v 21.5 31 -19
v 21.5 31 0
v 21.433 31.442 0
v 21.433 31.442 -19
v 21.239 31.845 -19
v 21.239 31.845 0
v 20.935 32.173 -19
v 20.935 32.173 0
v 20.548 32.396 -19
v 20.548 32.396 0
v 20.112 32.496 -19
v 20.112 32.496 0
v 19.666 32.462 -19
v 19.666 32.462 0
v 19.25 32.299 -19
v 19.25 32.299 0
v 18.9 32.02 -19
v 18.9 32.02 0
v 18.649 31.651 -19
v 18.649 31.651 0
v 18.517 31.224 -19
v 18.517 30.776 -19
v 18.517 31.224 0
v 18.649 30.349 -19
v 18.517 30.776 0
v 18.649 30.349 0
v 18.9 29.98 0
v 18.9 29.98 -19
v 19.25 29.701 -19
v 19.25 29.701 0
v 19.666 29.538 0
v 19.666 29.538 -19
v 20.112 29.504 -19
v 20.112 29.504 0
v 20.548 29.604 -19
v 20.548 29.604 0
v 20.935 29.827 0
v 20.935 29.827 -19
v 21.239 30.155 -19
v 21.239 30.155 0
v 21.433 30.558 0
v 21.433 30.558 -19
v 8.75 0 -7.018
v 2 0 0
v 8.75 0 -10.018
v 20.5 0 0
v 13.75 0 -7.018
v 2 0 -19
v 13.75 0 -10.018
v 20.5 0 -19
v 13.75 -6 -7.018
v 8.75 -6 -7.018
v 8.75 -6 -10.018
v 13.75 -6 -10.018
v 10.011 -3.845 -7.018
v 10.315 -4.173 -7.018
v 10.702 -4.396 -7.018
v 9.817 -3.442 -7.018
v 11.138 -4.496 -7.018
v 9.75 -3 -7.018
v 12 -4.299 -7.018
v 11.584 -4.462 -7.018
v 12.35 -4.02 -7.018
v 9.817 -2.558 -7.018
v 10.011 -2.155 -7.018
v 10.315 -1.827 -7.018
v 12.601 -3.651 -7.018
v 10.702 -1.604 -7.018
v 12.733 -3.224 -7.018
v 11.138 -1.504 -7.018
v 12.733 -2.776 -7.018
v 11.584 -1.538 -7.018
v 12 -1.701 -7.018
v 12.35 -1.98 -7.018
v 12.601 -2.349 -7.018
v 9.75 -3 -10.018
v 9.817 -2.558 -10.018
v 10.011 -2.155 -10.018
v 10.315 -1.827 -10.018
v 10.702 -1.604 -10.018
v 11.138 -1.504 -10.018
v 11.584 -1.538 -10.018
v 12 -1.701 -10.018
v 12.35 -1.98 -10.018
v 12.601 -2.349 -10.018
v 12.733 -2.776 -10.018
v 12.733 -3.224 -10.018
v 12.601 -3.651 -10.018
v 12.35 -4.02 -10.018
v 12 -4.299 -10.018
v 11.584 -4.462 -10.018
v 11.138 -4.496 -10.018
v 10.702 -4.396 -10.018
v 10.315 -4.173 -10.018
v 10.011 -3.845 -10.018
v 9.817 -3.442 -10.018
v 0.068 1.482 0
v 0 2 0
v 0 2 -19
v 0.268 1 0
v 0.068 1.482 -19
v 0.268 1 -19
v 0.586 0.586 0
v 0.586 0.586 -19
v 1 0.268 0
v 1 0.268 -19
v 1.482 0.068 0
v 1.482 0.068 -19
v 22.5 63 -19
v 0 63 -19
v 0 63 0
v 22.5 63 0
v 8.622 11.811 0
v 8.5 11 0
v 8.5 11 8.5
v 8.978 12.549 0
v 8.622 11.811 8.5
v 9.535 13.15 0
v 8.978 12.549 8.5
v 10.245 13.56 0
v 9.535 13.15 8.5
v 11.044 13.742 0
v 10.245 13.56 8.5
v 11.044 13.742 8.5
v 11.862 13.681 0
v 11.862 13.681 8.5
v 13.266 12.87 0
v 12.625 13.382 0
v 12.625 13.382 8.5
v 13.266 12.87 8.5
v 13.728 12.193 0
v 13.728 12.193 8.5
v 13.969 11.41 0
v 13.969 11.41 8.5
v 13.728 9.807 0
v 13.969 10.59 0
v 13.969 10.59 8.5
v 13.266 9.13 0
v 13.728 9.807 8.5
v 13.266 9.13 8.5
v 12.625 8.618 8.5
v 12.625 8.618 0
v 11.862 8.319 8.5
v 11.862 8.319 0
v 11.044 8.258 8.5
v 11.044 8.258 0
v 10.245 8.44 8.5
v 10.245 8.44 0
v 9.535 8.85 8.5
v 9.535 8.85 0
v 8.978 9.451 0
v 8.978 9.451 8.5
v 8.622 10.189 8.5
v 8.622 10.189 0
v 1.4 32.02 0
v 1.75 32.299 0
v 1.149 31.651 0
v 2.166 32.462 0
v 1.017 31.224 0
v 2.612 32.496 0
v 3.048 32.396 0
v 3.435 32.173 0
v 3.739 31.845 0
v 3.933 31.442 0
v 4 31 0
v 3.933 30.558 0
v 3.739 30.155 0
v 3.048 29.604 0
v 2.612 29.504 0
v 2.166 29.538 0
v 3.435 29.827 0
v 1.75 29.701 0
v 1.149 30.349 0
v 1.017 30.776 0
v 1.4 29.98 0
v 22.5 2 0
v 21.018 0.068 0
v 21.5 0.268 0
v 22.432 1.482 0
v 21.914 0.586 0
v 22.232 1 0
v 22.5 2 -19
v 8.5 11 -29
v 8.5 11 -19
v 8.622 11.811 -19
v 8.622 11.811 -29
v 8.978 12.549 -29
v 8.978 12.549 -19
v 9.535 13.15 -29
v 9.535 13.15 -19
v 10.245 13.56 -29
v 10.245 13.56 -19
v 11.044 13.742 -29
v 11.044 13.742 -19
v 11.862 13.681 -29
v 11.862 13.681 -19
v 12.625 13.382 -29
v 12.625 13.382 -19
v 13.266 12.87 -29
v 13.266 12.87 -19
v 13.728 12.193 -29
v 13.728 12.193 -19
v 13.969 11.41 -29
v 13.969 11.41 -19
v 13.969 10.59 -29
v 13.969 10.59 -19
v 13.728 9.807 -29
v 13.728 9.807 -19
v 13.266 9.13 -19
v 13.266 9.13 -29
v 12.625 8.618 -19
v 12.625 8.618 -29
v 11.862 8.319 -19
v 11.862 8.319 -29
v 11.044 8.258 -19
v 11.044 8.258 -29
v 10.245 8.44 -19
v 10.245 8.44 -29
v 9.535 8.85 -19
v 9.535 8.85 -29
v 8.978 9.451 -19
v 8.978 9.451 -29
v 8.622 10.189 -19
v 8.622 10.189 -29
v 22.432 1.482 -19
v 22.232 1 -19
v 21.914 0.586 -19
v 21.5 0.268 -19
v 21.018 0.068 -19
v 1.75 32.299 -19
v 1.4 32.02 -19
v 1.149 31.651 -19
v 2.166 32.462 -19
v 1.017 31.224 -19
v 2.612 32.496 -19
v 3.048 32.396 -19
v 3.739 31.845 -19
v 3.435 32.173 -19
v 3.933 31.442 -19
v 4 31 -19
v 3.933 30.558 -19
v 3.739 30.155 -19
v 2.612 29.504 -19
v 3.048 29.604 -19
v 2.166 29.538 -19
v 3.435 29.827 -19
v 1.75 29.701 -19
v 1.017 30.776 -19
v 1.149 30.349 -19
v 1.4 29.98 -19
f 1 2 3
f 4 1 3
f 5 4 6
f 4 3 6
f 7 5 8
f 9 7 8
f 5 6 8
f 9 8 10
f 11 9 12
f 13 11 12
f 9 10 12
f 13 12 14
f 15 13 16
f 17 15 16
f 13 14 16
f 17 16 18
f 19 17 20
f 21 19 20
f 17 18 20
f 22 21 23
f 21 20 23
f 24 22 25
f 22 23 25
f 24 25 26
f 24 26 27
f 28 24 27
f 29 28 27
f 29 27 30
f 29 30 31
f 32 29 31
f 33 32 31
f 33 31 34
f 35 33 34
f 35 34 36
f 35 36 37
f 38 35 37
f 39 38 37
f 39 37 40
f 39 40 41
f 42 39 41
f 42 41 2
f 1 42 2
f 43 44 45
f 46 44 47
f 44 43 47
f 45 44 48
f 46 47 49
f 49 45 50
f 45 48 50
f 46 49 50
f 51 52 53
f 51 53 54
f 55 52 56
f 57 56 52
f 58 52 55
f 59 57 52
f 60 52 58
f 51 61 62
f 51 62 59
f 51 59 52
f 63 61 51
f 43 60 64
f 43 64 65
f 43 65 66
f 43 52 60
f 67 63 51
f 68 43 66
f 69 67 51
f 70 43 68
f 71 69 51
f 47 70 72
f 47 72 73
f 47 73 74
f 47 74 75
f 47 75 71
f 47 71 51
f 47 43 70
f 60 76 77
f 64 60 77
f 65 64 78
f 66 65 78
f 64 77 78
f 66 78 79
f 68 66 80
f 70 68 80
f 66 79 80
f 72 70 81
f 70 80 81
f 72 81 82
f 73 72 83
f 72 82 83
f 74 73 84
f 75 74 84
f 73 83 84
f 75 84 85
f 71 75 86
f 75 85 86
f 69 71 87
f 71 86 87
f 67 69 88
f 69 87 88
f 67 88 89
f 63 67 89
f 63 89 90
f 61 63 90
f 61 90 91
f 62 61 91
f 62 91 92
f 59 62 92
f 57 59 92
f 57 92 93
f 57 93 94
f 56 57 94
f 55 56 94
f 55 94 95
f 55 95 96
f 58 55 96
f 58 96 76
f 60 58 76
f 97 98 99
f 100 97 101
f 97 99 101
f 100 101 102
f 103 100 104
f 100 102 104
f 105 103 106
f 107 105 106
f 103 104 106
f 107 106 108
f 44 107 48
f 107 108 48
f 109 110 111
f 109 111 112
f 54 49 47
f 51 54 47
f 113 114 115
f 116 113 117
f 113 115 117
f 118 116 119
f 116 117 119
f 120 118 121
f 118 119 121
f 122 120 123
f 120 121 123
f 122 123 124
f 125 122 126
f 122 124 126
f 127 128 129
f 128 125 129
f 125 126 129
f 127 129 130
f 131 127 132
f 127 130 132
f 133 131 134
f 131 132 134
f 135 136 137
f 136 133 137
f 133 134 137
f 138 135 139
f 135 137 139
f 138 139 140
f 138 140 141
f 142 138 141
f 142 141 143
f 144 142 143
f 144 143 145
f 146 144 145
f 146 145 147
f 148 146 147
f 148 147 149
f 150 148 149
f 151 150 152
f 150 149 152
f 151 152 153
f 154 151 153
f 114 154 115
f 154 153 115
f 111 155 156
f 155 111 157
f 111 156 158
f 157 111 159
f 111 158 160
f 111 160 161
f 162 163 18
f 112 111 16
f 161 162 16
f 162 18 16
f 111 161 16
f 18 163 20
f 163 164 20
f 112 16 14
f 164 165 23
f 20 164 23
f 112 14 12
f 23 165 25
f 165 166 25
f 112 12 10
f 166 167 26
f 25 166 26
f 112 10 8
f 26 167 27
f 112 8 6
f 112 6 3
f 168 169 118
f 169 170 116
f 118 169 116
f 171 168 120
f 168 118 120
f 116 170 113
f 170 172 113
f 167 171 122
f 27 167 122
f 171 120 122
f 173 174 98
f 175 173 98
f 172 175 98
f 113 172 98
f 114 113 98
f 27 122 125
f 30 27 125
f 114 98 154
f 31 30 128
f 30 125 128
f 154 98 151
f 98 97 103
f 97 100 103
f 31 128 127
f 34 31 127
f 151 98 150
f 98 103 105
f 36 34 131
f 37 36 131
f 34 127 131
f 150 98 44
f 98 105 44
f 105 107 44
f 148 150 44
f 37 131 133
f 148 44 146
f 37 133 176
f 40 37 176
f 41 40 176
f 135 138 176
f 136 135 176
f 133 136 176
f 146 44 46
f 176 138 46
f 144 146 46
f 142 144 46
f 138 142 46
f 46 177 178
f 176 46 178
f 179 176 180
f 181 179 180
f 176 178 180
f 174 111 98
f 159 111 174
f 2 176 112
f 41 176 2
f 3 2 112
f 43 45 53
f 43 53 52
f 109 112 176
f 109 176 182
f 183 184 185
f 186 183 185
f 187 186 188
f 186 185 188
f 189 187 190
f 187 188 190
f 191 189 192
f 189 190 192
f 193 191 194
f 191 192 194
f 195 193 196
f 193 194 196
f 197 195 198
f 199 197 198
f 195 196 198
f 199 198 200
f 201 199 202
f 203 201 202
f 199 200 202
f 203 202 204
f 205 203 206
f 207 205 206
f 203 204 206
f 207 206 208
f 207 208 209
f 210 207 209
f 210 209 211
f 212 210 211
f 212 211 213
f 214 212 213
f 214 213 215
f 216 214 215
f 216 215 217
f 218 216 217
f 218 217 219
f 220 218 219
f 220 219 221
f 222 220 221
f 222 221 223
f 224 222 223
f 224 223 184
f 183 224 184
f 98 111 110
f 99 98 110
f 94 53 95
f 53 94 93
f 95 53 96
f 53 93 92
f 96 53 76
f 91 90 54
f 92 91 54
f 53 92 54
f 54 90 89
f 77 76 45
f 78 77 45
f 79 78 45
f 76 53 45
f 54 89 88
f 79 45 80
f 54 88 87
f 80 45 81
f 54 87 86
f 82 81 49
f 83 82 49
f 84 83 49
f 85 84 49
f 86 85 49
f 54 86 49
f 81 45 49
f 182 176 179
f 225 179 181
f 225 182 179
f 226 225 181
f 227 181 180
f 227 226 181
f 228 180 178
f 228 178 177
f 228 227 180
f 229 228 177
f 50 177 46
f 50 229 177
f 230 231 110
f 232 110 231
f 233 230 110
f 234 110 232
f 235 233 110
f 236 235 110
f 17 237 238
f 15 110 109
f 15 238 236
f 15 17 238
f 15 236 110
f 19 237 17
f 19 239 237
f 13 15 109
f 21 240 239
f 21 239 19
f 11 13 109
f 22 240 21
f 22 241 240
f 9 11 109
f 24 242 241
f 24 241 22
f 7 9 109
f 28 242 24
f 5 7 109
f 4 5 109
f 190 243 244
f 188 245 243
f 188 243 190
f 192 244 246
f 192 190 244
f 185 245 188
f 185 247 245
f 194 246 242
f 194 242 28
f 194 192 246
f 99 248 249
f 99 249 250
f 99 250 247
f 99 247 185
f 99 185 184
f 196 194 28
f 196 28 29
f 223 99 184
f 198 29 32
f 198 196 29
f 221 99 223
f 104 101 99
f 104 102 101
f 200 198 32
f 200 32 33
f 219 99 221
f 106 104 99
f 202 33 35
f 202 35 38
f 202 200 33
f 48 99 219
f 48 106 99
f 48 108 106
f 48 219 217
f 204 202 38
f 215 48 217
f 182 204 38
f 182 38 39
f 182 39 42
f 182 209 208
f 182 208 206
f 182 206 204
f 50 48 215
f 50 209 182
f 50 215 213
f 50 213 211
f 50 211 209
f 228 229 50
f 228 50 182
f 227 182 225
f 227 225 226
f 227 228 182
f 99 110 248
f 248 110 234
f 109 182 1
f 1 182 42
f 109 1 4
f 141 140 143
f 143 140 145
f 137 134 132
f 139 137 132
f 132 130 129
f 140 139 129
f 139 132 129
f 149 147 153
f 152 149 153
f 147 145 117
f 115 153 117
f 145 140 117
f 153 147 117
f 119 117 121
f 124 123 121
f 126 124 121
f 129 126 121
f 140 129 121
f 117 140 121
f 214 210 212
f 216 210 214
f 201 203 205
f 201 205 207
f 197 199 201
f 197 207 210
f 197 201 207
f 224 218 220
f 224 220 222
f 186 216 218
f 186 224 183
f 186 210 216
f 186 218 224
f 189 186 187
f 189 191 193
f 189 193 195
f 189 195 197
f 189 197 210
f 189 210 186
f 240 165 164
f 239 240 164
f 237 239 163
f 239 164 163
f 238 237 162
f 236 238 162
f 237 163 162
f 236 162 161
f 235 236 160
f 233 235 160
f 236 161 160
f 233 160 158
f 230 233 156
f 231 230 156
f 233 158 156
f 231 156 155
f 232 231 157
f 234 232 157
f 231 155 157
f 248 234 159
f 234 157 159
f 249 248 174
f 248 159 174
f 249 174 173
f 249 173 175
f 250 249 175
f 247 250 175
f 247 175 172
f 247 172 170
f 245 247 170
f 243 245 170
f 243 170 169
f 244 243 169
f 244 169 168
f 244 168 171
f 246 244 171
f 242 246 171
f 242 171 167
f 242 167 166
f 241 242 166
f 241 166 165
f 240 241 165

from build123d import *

# Parameters (mm, degrees)
SKETCH1_W                = 22.5
SKETCH1_H                = 19
BOSS_EXTRUDE1_DEPTH      = 63
FILLET1_R                = 2
BOSS_EXTRUDE2_DEPTH      = 10
BOSS_EXTRUDE2_DEPTH_BACK = 27.5
SKETCH2_R                = 2.75
SKETCH3_W                = 5
SKETCH3_H                = 3
BOSS_EXTRUDE3_DEPTH      = 6
SKETCH4_R                = 1.5
CUT_EXTRUDE1_DEPTH       = 10
SKETCH5_R                = 1.5
CUT_EXTRUDE2_DEPTH       = 73.912618935


with BuildPart() as part:
    # Sketch1 → Boss-Extrude1 (new body)
    with BuildSketch(Plane(origin=(0, 0, 0), x_dir=(1, 0, 0), z_dir=(0, 1, 0))):
        with Locations((11.25, 9.5)):
            Rectangle(SKETCH1_W, SKETCH1_H)
    extrude(amount=BOSS_EXTRUDE1_DEPTH)

    # Fillet1
    fillet1_edges = [part.edges().sort_by_distance(p)[0] for p in [
        (22.5, 0, -9.5),
        (0, 0, -9.5),
    ]]
    fillet(fillet1_edges, radius=FILLET1_R)

    # Sketch2 → Boss-Extrude2 (add, two sides: drawn at the far end of the back side and taken through both)
    with BuildSketch(Plane(origin=(0, 0, -19), x_dir=(-1, 0, 0), z_dir=(0, 0, -1)).offset(-BOSS_EXTRUDE2_DEPTH_BACK)):
        with Locations((-11.25, 11)):
            Circle(SKETCH2_R)
    extrude(amount=BOSS_EXTRUDE2_DEPTH + BOSS_EXTRUDE2_DEPTH_BACK)

    # Sketch3 → Boss-Extrude3 (add)
    with BuildSketch(Plane.XZ):
        with Locations((11.25, -8.517818065)):
            Rectangle(SKETCH3_W, SKETCH3_H)
    extrude(amount=BOSS_EXTRUDE3_DEPTH)

    # Sketch4 → Cut-Extrude1 (cut)
    with BuildSketch(Plane(origin=(0, 0, -10.017818065), x_dir=(-1, 0, 0), z_dir=(0, 0, -1))):
        with Locations((-11.25, -3)):
            Circle(SKETCH4_R)
    extrude(amount=-CUT_EXTRUDE1_DEPTH, mode=Mode.SUBTRACT)

    # Sketch5 → Cut-Extrude2 (cut, through all)
    with BuildSketch(Plane.XY):
        with Locations((20, 31)):
            Circle(SKETCH5_R)
        with Locations((2.5, 31)):
            Circle(SKETCH5_R)
    extrude(amount=-CUT_EXTRUDE2_DEPTH, mode=Mode.SUBTRACT)


solid = part.part
